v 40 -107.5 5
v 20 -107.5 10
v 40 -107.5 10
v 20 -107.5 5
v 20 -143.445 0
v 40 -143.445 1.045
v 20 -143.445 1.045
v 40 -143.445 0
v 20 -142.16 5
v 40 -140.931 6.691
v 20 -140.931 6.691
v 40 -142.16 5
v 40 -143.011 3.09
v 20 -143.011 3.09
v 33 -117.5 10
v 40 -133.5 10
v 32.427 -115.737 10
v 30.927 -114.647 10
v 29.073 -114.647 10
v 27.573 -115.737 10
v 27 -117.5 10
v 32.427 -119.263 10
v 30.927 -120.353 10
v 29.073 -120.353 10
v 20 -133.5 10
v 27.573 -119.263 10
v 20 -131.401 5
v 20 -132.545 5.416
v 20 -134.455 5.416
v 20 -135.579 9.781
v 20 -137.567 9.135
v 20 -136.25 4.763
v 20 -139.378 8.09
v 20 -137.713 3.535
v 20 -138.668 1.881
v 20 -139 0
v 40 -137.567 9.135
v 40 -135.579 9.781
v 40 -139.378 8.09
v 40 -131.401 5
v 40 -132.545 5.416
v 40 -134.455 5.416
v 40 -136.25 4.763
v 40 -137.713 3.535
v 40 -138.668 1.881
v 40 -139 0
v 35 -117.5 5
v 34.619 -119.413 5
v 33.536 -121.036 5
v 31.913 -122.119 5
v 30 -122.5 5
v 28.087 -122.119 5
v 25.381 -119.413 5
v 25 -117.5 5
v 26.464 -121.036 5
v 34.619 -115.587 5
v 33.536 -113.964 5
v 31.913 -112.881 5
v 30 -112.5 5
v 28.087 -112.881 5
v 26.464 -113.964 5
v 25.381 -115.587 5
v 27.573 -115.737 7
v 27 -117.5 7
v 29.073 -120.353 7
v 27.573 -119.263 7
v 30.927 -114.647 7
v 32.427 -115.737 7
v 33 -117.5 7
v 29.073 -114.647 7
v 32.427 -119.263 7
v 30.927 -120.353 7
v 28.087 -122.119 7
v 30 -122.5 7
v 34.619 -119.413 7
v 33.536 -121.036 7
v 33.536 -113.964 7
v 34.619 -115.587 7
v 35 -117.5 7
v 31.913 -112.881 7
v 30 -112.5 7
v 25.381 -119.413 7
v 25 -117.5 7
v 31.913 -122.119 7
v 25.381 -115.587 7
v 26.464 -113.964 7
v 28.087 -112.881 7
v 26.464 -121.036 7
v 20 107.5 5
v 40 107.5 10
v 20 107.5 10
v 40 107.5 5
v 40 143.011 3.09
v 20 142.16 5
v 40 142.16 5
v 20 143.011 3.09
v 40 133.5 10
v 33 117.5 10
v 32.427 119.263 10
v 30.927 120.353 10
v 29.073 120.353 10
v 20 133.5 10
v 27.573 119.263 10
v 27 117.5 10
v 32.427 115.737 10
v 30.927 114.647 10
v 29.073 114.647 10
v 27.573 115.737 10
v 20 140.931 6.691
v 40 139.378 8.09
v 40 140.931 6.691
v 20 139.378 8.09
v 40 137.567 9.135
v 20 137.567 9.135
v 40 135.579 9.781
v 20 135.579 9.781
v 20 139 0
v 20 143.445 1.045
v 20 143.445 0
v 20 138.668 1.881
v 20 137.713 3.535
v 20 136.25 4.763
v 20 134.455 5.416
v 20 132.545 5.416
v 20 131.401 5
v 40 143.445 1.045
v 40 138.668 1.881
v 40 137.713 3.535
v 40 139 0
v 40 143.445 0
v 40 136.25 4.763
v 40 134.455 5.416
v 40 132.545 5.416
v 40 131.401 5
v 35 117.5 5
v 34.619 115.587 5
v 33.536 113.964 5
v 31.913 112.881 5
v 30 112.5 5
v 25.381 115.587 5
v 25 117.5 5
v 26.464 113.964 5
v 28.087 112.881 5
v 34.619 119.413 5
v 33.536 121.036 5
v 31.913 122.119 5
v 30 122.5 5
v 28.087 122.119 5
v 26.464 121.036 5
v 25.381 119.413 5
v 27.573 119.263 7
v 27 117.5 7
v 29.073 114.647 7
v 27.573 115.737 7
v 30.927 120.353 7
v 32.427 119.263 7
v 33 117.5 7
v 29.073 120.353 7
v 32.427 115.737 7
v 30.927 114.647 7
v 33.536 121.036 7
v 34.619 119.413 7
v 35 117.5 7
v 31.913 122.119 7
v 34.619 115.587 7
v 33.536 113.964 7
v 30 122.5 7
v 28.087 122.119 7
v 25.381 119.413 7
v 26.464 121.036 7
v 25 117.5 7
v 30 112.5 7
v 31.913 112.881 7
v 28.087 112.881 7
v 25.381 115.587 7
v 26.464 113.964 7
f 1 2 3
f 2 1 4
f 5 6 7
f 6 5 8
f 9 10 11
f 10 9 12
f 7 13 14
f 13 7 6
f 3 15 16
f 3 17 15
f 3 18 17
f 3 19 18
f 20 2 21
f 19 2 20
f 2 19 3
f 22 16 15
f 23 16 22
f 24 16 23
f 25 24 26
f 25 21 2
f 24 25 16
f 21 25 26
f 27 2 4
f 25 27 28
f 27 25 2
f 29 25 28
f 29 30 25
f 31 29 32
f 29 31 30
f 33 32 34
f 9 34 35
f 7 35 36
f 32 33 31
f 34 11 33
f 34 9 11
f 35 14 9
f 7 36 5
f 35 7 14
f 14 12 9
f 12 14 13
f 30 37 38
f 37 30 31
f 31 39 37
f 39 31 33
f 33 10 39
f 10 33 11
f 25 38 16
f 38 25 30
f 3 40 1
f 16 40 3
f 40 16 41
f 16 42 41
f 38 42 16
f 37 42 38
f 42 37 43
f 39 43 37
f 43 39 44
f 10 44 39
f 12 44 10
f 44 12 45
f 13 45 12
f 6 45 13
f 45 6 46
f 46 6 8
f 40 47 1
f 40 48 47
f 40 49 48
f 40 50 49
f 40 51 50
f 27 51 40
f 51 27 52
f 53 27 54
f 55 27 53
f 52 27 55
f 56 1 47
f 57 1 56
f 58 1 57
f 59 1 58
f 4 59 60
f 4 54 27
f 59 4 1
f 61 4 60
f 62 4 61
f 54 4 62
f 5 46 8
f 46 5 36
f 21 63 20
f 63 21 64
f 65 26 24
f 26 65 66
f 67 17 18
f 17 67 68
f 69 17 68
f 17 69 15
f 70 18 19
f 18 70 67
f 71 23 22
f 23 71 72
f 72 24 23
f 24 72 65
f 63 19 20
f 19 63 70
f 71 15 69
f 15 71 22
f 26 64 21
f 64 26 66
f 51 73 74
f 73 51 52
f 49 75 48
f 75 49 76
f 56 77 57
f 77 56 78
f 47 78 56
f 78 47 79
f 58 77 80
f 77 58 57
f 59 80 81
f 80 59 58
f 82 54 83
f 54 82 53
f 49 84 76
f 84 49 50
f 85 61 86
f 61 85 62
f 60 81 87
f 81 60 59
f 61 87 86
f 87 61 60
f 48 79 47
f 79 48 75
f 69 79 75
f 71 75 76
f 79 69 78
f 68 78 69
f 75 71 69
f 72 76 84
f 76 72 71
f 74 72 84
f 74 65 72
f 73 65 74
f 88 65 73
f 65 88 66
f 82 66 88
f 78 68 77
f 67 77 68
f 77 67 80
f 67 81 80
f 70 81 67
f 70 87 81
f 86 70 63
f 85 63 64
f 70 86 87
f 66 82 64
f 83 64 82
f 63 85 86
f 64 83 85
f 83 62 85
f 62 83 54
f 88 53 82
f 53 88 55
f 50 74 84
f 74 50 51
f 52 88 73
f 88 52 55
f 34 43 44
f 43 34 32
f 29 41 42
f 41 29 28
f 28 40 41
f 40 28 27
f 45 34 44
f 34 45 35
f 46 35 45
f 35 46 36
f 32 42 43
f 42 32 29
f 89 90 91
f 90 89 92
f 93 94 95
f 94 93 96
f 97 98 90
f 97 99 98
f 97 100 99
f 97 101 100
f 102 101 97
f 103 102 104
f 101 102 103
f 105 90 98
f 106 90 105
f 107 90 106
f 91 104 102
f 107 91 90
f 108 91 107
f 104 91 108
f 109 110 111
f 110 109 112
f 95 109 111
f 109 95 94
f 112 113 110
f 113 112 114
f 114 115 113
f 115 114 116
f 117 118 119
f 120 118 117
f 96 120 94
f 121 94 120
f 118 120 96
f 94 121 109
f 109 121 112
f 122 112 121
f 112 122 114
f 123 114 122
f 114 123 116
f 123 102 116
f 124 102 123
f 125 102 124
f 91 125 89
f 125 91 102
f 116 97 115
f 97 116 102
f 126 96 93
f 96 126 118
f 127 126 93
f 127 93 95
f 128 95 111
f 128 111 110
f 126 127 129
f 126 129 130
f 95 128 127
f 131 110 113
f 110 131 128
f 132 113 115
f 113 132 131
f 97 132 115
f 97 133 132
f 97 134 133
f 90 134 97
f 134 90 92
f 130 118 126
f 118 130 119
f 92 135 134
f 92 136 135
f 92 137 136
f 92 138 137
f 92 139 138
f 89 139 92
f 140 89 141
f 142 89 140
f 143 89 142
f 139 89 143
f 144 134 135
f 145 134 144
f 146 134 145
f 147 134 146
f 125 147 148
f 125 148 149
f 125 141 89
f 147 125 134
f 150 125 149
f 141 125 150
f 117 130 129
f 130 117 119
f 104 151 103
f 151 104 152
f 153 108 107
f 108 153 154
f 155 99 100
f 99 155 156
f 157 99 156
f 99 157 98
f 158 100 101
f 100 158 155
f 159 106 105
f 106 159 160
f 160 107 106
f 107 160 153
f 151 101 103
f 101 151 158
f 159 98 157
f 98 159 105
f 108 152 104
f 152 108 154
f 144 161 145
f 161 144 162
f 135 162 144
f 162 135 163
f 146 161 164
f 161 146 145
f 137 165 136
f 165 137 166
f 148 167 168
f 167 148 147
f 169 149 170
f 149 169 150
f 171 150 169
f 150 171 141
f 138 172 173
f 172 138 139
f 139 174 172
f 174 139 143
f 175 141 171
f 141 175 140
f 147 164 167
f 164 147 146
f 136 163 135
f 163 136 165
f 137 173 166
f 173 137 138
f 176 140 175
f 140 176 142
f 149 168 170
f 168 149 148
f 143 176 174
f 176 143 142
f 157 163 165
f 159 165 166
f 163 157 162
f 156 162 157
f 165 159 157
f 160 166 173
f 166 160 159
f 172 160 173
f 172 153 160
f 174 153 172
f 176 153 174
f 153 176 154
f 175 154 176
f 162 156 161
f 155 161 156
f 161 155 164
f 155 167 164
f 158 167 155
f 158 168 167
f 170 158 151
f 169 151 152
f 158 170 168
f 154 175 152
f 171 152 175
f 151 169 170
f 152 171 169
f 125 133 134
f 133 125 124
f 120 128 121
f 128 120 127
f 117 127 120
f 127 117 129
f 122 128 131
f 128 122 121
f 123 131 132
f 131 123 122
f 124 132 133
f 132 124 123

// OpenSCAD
include <vitamine.scad>

module link_deck(){
    difference(){
        cube([75,20,20],center=true);
        cube([18,100,10],center=true);
        translate([64.1/2,0,0])rotate([90,0,0]) cylinder(d=4,h=100,center=true);
        translate([-64.1/2,0,0])rotate([90,0,0]) cylinder(d=4,h=100,center=true);
        translate([-64.1/2,5,0])rotate([90,0,0]) cylinder(d=9,h=20,center=true);
        translate([64.1/2,5,0])rotate([90,0,0]) cylinder(d=9,h=20,center=true);
        rotate([0,0,90]) cylinder(d=11,h=100,center=true);
    }
}

module link_profile(){
    for(i = [-1,1]){
        difference(){
            hull(){
                translate([30,i*(255/2-10),0])cube([20,20,20],center=true);
                translate([30,i*(287/2-10),0])rotate([0,90,0])cylinder(d=20,h=20,center=true);
            }
            translate([30,i*(255/2-10),-5])cube([21,30,20],center=true);
            translate([30,i*(255/2-10),-10])cube([21,100,20],center=true);
            translate([30,i*(255/2-10),0])cylinder(d=6,h=30,center=true);
            translate([30,i*(255/2-10),0])cylinder(d=10,h=20-2*3,center=true);
            color("red",0.5)translate([0,i*(287/2-10),0]) rotate([0,90,0]) rotate([0,0,90]) cylinder(d=11,h=1000,center=true);
        }
        
    }
}
module full_view(){
   for(i = [-1,1]){
    translate([0,i*(287/2-10),0]) rotate([0,90,0])link_deck();
    translate([20,i*(255/2-10),22])rotate([0,90,0])profile(295);
    color("red",0.5)translate([0,i*(287/2-10),0]) rotate([0,90,0]) rotate([0,0,90]) cylinder(d=13,h=1000,center=true);
    }
    link_profile();
} 
link_profile();
//full_view();
